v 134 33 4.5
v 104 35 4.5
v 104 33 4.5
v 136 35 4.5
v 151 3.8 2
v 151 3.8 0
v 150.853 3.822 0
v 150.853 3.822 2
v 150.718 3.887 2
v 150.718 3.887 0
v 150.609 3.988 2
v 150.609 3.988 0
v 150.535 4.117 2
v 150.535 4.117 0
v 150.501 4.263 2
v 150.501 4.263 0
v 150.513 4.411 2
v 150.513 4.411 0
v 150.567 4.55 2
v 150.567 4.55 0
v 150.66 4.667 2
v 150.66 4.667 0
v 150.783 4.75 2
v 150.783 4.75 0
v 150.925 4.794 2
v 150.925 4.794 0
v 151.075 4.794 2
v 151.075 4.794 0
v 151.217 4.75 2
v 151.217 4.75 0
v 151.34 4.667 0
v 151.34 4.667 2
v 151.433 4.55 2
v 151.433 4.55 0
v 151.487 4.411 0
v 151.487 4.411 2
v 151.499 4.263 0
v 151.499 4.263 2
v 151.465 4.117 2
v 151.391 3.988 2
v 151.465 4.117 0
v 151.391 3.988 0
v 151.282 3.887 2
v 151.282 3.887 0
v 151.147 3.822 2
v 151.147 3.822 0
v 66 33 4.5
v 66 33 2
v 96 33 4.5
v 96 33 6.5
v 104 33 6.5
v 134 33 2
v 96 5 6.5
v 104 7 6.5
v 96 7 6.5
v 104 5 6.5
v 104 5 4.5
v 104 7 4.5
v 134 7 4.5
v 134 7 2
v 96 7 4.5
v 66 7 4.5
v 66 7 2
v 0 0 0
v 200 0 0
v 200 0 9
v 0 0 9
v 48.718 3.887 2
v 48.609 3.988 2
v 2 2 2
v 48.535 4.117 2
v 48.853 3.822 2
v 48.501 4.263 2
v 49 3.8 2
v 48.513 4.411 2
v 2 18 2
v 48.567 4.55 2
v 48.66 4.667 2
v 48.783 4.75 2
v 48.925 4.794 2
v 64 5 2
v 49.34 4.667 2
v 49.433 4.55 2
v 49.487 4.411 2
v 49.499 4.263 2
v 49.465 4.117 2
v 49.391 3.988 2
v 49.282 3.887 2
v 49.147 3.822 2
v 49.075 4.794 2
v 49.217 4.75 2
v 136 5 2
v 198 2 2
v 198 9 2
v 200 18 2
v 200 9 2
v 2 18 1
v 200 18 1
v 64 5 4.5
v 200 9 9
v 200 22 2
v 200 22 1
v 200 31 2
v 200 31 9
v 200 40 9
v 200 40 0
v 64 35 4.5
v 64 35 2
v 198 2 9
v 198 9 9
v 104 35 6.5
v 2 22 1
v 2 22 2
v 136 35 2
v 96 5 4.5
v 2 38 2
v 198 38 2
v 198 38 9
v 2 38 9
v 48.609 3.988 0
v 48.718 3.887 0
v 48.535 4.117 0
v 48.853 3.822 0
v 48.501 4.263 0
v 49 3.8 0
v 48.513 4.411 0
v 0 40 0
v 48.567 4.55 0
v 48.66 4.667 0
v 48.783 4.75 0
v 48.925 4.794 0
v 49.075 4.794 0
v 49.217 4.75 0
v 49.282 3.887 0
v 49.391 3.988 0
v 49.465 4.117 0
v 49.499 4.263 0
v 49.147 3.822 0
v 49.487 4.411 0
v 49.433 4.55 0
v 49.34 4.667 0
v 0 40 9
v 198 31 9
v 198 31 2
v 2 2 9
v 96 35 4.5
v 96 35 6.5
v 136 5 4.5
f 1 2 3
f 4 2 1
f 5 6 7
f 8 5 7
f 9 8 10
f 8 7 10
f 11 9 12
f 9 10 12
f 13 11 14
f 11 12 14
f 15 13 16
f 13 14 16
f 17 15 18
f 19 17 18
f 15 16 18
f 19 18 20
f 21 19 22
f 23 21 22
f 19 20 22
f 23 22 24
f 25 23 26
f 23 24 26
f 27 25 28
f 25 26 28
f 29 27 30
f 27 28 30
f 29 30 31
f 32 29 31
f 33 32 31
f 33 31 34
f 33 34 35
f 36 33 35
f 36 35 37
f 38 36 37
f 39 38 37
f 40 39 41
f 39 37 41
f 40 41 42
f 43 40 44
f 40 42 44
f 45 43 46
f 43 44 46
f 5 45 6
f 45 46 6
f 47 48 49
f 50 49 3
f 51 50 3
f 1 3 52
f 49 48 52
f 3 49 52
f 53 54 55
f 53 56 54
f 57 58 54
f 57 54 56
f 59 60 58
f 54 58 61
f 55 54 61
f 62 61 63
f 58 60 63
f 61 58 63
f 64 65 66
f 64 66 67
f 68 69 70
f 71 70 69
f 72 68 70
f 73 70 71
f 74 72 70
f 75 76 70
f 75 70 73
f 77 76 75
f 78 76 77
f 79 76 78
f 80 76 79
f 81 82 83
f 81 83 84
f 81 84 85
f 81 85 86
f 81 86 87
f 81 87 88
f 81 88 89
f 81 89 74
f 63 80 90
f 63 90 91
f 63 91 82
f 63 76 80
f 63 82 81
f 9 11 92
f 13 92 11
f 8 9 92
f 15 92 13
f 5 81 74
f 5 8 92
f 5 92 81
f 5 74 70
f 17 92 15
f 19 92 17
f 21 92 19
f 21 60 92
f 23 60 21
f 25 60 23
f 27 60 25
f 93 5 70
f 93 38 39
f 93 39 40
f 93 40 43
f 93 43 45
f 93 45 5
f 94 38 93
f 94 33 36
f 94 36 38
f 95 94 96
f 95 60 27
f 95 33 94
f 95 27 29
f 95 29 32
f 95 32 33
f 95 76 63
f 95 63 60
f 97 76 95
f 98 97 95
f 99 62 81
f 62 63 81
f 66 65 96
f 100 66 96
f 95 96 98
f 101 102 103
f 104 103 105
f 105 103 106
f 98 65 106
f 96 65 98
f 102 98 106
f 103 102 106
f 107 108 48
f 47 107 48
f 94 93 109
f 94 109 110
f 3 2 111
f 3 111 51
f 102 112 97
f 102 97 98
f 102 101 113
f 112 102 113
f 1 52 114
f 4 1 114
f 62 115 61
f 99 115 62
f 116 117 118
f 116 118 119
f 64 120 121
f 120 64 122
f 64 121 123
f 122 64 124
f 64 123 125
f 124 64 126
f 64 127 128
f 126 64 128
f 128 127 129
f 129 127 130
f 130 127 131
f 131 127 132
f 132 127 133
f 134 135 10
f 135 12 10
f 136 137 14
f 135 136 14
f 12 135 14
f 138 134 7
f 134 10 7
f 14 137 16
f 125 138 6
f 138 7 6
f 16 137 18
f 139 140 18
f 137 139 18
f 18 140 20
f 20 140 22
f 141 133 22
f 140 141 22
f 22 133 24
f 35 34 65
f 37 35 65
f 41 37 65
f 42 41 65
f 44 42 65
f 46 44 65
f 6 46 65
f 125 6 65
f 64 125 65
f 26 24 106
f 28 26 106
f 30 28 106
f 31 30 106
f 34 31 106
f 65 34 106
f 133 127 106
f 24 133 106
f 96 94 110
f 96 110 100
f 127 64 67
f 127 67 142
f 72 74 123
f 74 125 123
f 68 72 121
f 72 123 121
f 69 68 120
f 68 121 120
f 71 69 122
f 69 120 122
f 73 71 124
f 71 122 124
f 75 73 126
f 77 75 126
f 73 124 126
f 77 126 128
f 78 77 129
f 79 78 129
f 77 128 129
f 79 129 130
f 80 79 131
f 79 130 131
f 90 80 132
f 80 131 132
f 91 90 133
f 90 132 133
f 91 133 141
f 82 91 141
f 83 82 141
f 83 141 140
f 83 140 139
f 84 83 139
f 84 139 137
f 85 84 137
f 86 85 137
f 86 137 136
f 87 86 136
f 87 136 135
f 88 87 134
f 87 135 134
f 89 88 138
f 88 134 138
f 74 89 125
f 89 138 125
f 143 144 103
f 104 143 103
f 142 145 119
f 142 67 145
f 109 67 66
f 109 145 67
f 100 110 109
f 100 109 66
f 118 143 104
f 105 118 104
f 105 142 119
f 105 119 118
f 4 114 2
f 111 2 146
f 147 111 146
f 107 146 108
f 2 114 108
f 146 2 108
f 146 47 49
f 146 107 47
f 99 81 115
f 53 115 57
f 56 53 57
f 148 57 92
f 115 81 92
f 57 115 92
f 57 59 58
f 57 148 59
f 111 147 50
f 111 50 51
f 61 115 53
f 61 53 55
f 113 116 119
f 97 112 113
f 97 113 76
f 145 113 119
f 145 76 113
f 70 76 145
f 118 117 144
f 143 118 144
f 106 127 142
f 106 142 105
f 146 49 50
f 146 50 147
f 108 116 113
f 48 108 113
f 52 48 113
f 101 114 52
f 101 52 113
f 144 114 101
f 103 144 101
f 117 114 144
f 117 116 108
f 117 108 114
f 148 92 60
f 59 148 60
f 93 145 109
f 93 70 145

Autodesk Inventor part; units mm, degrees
ref_plane "YZ Plane" through (0, 0, 0) normal (1, 0, 0) x (0, 1, 0)
ref_plane "XZ Plane" through (0, 0, 0) normal (0, 1, 0) x (-1, 0, 0)
sketch "Boceto1" plane through (0, 0, 0) normal (0, 0, 1) x (1, 0, 0)
  line L0 (0, 0) -> (200, 0)
  line L1 (200, 0) -> (200, 40)
  line L2 (200, 40) -> (0, 40)
  line L3 (0, 40) -> (0, 0)
  dimension "d0" = 200
  dimension "d1" = 40
extrude "Base" add sketch "Boceto1" along normal blind 2
sketch "Boceto2" plane through (0, 0, 2) normal (0, 0, 1) x (1, 0, 0)
  line L0 (200, 40) -> (200, 0) projected
  line L1 (200, 22) -> (2, 22)
  line L2 (2, 22) -> (2, 18)
  line L3 (2, 18) -> (200, 18)
  line L4 (200, 18) -> (200, 22)
  point P0 (0, 40)
  point P1 (200, 20)
  dimension "d4" = 4
  dimension "d5" = 2
extrude "Canal" cut sketch "Boceto2" against normal blind 1
sketch "Boceto3" plane through (0, 0, 2) normal (0, 0, 1) x (1, 0, 0)
  line L0 (2, 22) -> (200, 22) projected
  line L1 (200, 40) -> (200, 22) projected
  line L2 (0, 40) -> (200, 40) projected
  line L3 (0, 0) -> (0, 40) projected
  line L4 (200, 0) -> (0, 0) projected
  line L5 (200, 18) -> (200, 0) projected
  line L6 (198, 38) -> (2, 38)
  line L7 (2, 38) -> (2, 2)
  line L8 (2, 2) -> (198, 2)
  line L9 (198, 2) -> (198, 9)
  line L10 (198, 9) -> (200, 9)
  line L11 (198, 38) -> (198, 31)
  line L12 (198, 31) -> (200, 31)
  dimension "d8" = 2
  dimension "d9" = 2
  dimension "d10" = 2
  dimension "d11" = 2
  dimension "d12" = 2
  dimension "d33" = 7
  dimension "d34" = 7
extrude "Paredes" add sketch "Boceto3" along normal blind 7 contours L7 L8 L9 L10 L5 L4 L3 L2 L1 L12 L11 L6
ref_plane "Mitad" through (1, 20, 0) normal (0, 1, 0) x (1, 0, 0)
sketch "Boceto4" plane through (0, 0, 2) normal (0, 0, 1) x (1, 0, 0)
  line L0 (200, 0) -> (0, 0) projected
  point P0 (49, 4.3)
  point P1 (151, 4.3)
  dimension "d36" = 4.3
  dimension "d37" = 4.3
hole "Hole1" at (49, 4.3, 2) at (151, 4.3, 2) direction (0, 0, -1) diameter 1 end through all
sketch "Boceto5" plane through (0, 0, 2) normal (0, 0, 1) x (1, 0, 0)
  line L0 (2, 38) -> (2, 22) projected
  line L1 (198, 38) -> (2, 38) projected
  line L2 (136, 35) -> (64, 35)
  line L3 (64, 35) -> (66, 33)
  line L4 (66, 33) -> (134, 33)
  line L5 (134, 33) -> (136, 35)
  line L6 (198, 31) -> (198, 38) projected
  point P0 (0, 0)
  dimension "d23" = 2
  dimension "d24" = 2
  dimension "d25" = 3
  dimension "d26" = 62
  dimension "d35" = 62
extrude "Extrusión4" add sketch "Boceto5" along normal blind 2.5
sketch "Boceto6" plane through (0, 0, 4.5) normal (0, 0, 1) x (1, 0, 0)
  line L0 (64, 35) -> (136, 35) projected
  line L1 (134, 33) -> (66, 33) projected
  line L2 (96, 35) -> (104, 35)
  line L3 (104, 35) -> (104, 33)
  line L4 (104, 33) -> (96, 33)
  line L5 (96, 33) -> (96, 35)
  point P0 (0, 0)
  point P1 (100, 35)
  dimension "d30" = 8
extrude "Extrusión5" add sketch "Boceto6" along normal blind 2
mirror "Simetría1" about plane through (1, 20, 0) normal (0, 1, 0) of "Extrusión4", "Extrusión5"
properties part number "Base"
